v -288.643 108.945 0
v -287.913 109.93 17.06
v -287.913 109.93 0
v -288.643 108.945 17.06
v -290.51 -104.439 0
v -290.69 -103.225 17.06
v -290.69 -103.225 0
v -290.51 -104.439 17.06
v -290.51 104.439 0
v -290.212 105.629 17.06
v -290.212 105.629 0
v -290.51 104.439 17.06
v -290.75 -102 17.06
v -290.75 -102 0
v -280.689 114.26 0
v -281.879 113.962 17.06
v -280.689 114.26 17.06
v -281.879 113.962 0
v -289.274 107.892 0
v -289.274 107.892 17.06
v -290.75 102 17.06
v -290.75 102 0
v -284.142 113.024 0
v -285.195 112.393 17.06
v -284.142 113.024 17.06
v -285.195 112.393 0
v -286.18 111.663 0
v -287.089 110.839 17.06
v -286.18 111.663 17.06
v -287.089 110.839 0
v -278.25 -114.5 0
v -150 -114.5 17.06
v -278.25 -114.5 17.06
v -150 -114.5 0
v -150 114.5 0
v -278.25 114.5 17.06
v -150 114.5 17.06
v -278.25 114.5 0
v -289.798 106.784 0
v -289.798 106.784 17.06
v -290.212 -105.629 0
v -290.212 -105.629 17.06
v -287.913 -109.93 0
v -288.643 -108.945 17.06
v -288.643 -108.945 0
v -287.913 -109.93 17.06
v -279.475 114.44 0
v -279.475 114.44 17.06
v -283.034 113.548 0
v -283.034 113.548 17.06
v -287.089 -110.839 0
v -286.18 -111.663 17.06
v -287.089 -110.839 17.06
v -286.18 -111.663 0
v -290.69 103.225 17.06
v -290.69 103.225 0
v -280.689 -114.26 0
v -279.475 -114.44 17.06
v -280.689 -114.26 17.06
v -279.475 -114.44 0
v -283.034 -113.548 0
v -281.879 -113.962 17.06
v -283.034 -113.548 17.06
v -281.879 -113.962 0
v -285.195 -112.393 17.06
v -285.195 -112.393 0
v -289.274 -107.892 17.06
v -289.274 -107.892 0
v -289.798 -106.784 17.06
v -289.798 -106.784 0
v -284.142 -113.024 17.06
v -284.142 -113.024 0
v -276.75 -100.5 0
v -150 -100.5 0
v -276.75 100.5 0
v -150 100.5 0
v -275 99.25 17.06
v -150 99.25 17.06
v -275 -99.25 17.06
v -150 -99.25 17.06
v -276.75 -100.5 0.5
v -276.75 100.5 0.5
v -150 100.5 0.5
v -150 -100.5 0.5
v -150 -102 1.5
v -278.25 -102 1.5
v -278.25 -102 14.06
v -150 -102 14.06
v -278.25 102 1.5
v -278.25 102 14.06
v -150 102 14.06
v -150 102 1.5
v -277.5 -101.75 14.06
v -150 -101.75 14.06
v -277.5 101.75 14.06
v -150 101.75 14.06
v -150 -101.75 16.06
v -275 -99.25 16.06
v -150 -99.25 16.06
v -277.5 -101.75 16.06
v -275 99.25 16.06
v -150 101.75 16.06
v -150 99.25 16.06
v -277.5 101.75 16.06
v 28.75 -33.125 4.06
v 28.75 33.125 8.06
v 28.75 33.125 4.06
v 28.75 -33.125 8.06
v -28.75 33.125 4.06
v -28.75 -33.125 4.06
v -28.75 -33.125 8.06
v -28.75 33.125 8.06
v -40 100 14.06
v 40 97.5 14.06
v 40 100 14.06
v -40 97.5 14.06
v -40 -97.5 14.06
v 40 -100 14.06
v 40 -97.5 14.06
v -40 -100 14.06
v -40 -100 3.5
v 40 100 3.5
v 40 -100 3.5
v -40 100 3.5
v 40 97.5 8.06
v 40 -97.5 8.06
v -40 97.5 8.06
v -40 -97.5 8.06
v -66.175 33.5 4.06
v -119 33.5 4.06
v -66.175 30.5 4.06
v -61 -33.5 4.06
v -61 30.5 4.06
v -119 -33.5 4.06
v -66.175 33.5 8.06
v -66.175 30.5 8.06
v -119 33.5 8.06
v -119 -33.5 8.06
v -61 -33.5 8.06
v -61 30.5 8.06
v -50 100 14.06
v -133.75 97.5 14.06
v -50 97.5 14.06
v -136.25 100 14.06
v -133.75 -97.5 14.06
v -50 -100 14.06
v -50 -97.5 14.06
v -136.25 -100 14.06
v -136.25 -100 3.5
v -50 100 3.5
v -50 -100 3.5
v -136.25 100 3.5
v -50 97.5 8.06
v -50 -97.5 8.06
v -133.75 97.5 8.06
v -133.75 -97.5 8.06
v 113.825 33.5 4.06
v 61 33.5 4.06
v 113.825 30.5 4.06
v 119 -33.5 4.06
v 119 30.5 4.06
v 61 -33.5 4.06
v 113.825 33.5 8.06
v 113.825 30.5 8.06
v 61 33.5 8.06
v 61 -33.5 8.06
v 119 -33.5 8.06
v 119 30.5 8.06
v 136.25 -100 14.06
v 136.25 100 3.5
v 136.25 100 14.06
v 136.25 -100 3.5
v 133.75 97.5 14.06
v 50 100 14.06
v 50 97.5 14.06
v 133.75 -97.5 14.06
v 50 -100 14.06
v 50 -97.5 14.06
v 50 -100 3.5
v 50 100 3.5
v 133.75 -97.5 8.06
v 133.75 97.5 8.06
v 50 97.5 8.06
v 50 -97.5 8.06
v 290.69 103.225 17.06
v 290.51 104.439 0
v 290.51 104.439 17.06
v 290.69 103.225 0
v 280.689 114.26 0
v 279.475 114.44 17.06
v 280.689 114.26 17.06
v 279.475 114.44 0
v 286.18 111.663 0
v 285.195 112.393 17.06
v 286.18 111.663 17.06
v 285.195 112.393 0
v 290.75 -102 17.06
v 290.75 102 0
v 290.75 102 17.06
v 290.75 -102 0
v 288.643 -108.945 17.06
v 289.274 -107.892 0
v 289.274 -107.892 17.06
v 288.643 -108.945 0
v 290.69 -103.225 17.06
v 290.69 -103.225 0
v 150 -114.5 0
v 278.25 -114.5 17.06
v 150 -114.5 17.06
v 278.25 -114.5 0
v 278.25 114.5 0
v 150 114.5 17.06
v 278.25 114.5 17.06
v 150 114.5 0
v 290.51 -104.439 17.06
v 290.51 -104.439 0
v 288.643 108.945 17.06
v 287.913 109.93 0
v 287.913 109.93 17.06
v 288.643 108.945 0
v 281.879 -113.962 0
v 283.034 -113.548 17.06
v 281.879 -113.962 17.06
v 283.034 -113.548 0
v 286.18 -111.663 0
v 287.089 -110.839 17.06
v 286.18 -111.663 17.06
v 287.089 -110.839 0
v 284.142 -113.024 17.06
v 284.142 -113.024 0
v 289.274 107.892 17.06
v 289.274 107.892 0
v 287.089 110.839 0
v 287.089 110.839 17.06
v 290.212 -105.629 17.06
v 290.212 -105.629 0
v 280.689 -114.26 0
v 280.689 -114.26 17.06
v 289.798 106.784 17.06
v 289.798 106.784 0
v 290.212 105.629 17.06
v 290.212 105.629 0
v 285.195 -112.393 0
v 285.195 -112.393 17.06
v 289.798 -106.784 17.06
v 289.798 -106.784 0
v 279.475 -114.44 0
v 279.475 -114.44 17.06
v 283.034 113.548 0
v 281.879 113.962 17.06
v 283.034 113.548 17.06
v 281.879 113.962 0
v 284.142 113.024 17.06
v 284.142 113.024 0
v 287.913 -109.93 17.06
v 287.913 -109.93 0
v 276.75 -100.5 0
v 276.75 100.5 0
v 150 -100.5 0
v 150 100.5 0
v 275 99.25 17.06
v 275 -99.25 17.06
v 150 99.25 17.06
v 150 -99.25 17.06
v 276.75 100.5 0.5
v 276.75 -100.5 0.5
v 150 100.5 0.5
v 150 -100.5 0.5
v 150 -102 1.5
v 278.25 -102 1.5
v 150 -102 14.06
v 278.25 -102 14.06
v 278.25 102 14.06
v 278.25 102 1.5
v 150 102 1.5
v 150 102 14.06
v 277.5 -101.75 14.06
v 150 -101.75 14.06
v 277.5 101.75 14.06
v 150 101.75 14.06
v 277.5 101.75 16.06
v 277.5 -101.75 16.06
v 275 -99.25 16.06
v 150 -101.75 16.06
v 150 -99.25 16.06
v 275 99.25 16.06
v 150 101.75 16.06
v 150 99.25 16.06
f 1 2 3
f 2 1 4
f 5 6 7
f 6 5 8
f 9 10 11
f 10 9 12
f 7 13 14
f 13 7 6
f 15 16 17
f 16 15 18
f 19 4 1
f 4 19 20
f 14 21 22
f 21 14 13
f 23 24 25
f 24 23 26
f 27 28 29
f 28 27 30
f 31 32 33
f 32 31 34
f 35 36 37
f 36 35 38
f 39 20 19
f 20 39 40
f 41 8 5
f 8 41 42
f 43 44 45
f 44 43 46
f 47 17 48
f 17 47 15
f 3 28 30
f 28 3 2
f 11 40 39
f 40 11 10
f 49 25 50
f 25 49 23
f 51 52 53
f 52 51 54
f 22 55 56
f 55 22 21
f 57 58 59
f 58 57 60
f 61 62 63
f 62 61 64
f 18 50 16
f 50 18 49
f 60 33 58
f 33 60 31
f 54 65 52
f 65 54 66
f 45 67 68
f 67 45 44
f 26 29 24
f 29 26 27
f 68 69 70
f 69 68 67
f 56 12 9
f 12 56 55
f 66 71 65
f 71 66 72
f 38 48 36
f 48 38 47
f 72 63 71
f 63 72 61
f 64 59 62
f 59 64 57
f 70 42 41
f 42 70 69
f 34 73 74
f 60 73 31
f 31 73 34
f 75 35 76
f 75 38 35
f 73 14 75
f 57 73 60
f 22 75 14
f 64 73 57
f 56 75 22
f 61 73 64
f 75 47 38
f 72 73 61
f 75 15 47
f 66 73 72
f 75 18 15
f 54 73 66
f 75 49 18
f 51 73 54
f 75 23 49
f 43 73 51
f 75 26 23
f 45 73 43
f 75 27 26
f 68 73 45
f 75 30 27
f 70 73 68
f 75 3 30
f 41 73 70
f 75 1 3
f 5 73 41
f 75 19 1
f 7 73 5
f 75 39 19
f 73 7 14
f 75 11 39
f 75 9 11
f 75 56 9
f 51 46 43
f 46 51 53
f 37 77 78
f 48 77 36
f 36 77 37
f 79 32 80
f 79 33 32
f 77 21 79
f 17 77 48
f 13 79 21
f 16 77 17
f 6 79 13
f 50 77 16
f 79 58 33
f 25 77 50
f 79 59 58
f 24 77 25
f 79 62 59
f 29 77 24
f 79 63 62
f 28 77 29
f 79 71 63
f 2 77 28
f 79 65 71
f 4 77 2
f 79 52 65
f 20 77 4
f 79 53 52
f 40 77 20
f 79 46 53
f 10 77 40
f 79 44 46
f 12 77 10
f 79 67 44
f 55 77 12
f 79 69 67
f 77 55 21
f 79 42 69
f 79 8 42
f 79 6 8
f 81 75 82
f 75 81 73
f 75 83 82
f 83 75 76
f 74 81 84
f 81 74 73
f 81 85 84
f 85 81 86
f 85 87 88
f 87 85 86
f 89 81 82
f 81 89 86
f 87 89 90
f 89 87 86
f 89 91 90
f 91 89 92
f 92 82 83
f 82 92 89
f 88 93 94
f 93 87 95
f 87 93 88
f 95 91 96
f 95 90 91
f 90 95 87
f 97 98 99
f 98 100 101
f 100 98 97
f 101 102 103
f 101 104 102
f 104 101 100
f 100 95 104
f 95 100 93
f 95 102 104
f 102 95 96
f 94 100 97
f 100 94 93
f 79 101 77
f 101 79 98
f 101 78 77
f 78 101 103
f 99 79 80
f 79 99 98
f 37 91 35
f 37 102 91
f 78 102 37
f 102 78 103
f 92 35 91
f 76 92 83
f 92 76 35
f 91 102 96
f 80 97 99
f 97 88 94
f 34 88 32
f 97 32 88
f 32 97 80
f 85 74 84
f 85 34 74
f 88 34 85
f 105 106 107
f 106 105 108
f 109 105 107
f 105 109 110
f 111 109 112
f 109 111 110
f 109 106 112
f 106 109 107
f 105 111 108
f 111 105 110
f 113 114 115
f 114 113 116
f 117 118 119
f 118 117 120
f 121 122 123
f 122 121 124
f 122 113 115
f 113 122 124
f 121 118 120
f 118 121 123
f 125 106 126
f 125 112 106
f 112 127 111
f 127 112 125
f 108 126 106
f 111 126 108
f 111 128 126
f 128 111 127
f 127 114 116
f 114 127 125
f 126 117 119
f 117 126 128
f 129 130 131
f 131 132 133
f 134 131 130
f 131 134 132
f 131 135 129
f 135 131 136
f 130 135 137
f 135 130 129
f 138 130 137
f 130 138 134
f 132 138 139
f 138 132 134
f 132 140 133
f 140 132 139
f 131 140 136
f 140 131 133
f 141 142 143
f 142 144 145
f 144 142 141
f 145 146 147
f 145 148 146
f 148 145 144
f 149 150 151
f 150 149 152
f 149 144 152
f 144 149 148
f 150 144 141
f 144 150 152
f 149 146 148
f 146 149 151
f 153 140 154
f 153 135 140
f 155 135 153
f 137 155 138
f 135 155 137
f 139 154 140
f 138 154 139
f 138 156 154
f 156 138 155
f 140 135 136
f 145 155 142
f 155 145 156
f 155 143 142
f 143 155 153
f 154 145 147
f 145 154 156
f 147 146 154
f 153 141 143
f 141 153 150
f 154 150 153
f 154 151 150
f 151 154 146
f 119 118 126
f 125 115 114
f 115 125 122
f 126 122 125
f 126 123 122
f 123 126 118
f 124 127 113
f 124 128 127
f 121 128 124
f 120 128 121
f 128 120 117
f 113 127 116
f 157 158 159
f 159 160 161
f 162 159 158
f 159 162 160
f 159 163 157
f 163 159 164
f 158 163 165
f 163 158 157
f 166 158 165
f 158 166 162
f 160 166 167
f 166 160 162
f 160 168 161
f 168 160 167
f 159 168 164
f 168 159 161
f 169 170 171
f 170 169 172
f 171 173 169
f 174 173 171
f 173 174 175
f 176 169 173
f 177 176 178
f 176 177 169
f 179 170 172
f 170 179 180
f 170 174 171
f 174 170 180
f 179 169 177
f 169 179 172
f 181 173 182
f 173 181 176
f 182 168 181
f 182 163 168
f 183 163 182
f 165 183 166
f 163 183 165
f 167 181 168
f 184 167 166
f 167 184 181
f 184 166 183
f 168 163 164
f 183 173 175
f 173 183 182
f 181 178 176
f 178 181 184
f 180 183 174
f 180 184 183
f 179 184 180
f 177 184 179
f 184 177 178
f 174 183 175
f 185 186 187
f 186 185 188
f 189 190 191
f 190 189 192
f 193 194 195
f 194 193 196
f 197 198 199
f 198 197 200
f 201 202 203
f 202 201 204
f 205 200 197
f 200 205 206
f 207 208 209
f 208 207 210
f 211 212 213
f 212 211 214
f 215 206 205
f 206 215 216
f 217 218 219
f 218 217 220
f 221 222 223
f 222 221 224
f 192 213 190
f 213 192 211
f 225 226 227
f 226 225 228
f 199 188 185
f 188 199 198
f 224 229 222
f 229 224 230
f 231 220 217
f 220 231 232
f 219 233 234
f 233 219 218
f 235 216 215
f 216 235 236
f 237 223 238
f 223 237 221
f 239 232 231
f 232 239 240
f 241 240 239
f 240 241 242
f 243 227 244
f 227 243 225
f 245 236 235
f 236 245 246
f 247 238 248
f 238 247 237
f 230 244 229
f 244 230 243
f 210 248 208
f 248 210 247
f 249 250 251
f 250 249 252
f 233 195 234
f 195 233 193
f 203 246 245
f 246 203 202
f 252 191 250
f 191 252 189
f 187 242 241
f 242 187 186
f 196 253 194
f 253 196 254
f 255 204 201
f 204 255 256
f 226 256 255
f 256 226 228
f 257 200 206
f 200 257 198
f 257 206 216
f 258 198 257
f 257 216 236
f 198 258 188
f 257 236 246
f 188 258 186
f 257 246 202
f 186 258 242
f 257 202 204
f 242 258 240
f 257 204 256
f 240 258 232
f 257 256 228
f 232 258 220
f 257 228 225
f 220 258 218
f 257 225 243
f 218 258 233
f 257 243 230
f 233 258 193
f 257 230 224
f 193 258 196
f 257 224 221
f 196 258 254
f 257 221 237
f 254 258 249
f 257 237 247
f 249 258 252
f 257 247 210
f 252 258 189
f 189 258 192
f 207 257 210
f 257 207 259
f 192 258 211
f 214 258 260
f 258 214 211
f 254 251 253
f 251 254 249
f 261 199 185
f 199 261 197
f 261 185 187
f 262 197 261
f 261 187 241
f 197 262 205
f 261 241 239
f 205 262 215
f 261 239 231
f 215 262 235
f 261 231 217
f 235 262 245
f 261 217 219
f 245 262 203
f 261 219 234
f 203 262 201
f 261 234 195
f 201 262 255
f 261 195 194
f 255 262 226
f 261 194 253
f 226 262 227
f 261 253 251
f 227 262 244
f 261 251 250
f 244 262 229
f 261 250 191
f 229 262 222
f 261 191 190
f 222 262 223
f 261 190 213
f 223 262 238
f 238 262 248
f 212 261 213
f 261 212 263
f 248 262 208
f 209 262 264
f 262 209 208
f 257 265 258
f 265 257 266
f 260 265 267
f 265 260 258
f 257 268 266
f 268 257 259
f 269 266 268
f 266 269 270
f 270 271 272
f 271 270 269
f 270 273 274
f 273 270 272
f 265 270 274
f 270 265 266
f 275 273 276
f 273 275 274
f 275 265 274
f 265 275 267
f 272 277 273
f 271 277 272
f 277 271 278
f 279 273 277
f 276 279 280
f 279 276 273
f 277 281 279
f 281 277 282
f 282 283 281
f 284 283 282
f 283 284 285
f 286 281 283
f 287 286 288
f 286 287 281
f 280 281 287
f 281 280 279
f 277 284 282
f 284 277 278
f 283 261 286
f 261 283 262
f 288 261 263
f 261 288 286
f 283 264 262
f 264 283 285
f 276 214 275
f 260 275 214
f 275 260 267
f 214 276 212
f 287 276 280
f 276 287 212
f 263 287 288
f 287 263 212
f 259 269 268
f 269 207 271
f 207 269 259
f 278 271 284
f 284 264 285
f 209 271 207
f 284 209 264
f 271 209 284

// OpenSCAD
// file: ../inlays/nintendo_ds_game_card_inlay.scad
use <../../utilities/dictionary_get.scad>;

function nintendo_ds_game_card_inlay_width_mm() = 34;
function nintendo_ds_game_card_inlay_height_mm() = 36;

/**
 * A Nintendo DS game card (without the Nintendo 3DS tab).  Compatible with the
 * SPR, CTR, FTR, TWL and UTL models (and the un-codenamed "New 3DS" range).
 * Likely compatible with the USG and NTR models.
 * @param An array representing a dictionary, containing:
 *        - origin
 *          - x_mm - The origin of the inlay on the X axis, in millimeters.
 *          - y_mm - The origin of the inlay on the Y axis, in millimeters.
 * @return An array describing the inlay.
 */
function nintendo_ds_game_card_inlay(settings) =
  let (origin = dictionary_get(settings, "origin"))
  let (origin_x_mm = dictionary_get(origin, "x_mm"))
  let (origin_y_mm = dictionary_get(origin, "y_mm"))
  [
    ["type", "nintendo_ds_game_card"],
    [
      "origin",
      [
        ["x_mm", origin_x_mm],
        ["y_mm", origin_y_mm],
      ],
    ],
  ];
// file: ../utilities/settings.scad
/**
 * The number of millimeters that the glazing lip overlaps the glazing.
 */
function glazing_lip_thickness_mm() = 2.5;

/**
 * The depth of the glazing lip, in millimeters.
 */
function glazing_lip_depth_mm() = 1;

/**
 * The number of millimeters that the backing lip overlaps the backing.
 */
function backing_lip_thickness_mm() = 1.5;

/**
 * The depth of the backing lip, in millimeters.
 */
function backing_lip_depth_mm() = 1.5;

/**
 * The depth of slope to the backing lip, in millimeters.
 */
function backing_lip_slope_depth_mm() = 1;

/**
 * The minimum depth of the inlay layer, in millimeters.
 */
function inlay_bottom_depth_mm() = 0.56;

/**
 * The gap between the bottom of the glazing and the top of the displayed items,
 * in millimeters.
 */
function inlay_top_clearance_mm() = 1;

/**
 * The tolerance each side of the inlay in millimeters.
 */
function inlay_side_tolerance_mm() = 2;
// file: ../utilities/inlay_protrusion_depth_mm.scad
use <../../utilities/dictionary_get.scad>;

/**
 * Given an inlay, determines the depth (in millimeters) to which the inlay
 * should protrude from the frame.
 * @param inlay The inlay to measure.
 * @return      The depth (in millimeters) to which the inlay should protrude
 *              from the frame.
 */
function inlay_protrusion_depth_mm(inlay) = dictionary_get
(
  [
    ["nintendo_3ds_game_card", 1.3],
    ["nintendo_ds_game_card", 1.3],
    ["nintendo_game_boy_cartridge_a_or_b", 3],
    ["nintendo_game_boy_cartridge_c", 5],
  ],
  dictionary_get(inlay, "type")
);
// file: ../utilities/inlay_embed_depth_mm.scad
use <../../utilities/dictionary_get.scad>;

/**
 * Given an inlay, determines the depth (in millimeters) to which the inlay
 * should embed into the frame.
 * @param inlay The inlay to measure.
 * @return      The depth (in millimeters) to which the inlay should embed into
 *              the frame.
 */
function inlay_embed_depth_mm(inlay) = dictionary_get
(
  [
    ["nintendo_3ds_game_card", 2.5],
    ["nintendo_ds_game_card", 2.5],
    ["nintendo_game_boy_cartridge_a_or_b", 4],
    ["nintendo_game_boy_cartridge_c", 4],
  ],
  dictionary_get(inlay, "type")
);
// file: ../../utilities/dictionary_get.scad
/**
 * Retrieves a value by its key from an array representing a dictionary.
 * @param dictionary An array representing a dictionary.  Its contents must be
 *                   two-item arrays, each containing a key, then a value.
 * @param key        The key of the value to retrieve.
 * @return           The value matching the specified key.
 * @throws           When the key is not in the dictionary.
 * @throws           When the key is present in the dictionary multiple times.
 */
function dictionary_get(dictionary, key) =
  assert(
    len([for (item = dictionary) if (item[0] == key) item]) >= 1,
    "The given key was not found in the given dictionary"
  )
  assert(
    len([for (item = dictionary) if (item[0] == key) item]) <= 1,
    "The given key was found multiple times in the given dictionary"
  )
  [for (item = dictionary) if (item[0] == key) item][0][1];
// file: ../../utilities/slice_x.scad
module slice_x(left, right) {
  intersection() {
    translate([
      left,
      -10000,
      -10000,
    ]) {
      cube([
        right - left,
        20000,
        20000,
      ]);
    };

    children();
  };
};
// file: ../inlays/nintendo_game_boy_cartridge_c_inlay.scad
use <../../utilities/dictionary_get.scad>;

function nintendo_game_boy_cartridge_c_inlay_embed_width_mm() = 57.5;
function nintendo_game_boy_cartridge_c_inlay_embed_height_mm() = 66.25;

/**
 * A Nintendo Game Boy cartridge which does NOT have a notch in the top right
 * corner, compatible with the CGB, AGB and AGS models.
 * @param An array representing a dictionary, containing:
 *        - origin
 *          - x_mm - The origin of the inlay on the X axis, in millimeters.
 *          - y_mm - The origin of the inlay on the Y axis, in millimeters.
 * @return An array describing the inlay.
 */
function nintendo_game_boy_cartridge_c_inlay(settings) =
  let (origin = dictionary_get(settings, "origin"))
  let (origin_x_mm = dictionary_get(origin, "x_mm"))
  let (origin_y_mm = dictionary_get(origin, "y_mm"))
  [
    ["type", "nintendo_game_boy_cartridge_c"],
    [
      "origin",
      [
        ["x_mm", origin_x_mm],
        ["y_mm", origin_y_mm],
      ],
    ],
  ];

module nintendo_game_boy_cartridge_c_inlay(settings, inlay, embed_depth_mm) {
  translate([
    nintendo_game_boy_cartridge_c_inlay_embed_width_mm() / -2,
    nintendo_game_boy_cartridge_c_inlay_embed_height_mm() / -2,
    -embed_depth_mm,
  ]) {
    cube([
      nintendo_game_boy_cartridge_c_inlay_embed_width_mm(),
      nintendo_game_boy_cartridge_c_inlay_embed_height_mm(),
      embed_depth_mm,
    ]);
  };
};
// file: ../inlays/nintendo_game_boy_cartridge_a_or_b_inlay.scad
use <../../utilities/dictionary_get.scad>;

width_mm = 58;
height_mm = 67;

notch_width_mm = 5.175;
notch_height_mm = 3;

/**
 * A Nintendo Game Boy cartridge which has a notch in the top right corner,
 * compatible with the DMG, MGB, CGB, AGB and AGS models.
 * @param An array representing a dictionary, containing:
 *        - origin
 *          - x_mm - The origin of the inlay on the X axis, in millimeters.
 *          - y_mm - The origin of the inlay on the Y axis, in millimeters.
 * @return An array describing the inlay.
 */
function nintendo_game_boy_cartridge_a_or_b_inlay(settings) =
  let (origin = dictionary_get(settings, "origin"))
  let (origin_x_mm = dictionary_get(origin, "x_mm"))
  let (origin_y_mm = dictionary_get(origin, "y_mm"))
  [
    ["type", "nintendo_game_boy_cartridge_a_or_b"],
    [
      "origin",
      [
        ["x_mm", origin_x_mm],
        ["y_mm", origin_y_mm],
      ],
    ],
  ];

module nintendo_game_boy_cartridge_a_or_b_inlay(settings, inlay, embed_depth_mm) {
  translate([0, 0, -embed_depth_mm]) {
    linear_extrude(embed_depth_mm) {
      difference() {
        translate([width_mm / -2, height_mm / -2]) {
          square([width_mm, height_mm]);
        };

        translate([
          width_mm / 2 - notch_width_mm,
          height_mm / 2 - notch_height_mm,
        ]) {
          square([notch_width_mm, notch_height_mm]);
        };
      };
    };
  };
};
// file: ../borders/rounded_flat_border.scad
use <../../utilities/dictionary_get.scad>;

/**
 * A rounded flat border.
 * @param An array representing a dictionary, containing:
 *        - thickness_mm - The thickness of the frame in millimeters.
 *        - sides        - The number of sides per corner.
 * @return An array describing the border.
 */
function rounded_flat_border(settings) =
  let (thickness_mm = dictionary_get(settings, "thickness_mm"))
  let (sides = dictionary_get(settings, "sides"))
  [
    ["type", "rounded_flat"],
    ["thickness_mm", thickness_mm],
    ["sides", sides],
  ];
// file: ../backings/a4_backing.scad
/**
 * Measurements taken from a B&M "New York" frame.
 */
function a4_backing() = [
  ["width_mm", 256.5],
  ["height_mm", 204],
  ["depth_mm", 2],
];
// file: ../glazings/a4_glazing.scad
/**
 * Measurements taken from a B&M "New York" frame.
 */
function a4_glazing() = [
  ["width_mm", 255],
  ["height_mm", 203.5],
  ["depth_mm", 2],
];
// file: ../inlay.scad
use <../utilities/dictionary_get.scad>;
use <inlays/nintendo_ds_game_card_inlay.scad>;
use <inlays/nintendo_game_boy_cartridge_a_or_b_inlay.scad>;
use <inlays/nintendo_game_boy_cartridge_c_inlay.scad>;
use <utilities/inlay_embed_depth_mm.scad>;
use <utilities/inlay_protrusion_depth_mm.scad>;
use <utilities/settings.scad>;

module inlay(settings) {
  glazing = dictionary_get(settings, "glazing");
  glazing_width_mm = dictionary_get(glazing, "width_mm");
  glazing_height_mm = dictionary_get(glazing, "height_mm");

  backing = dictionary_get(settings, "backing");
  backing_width_mm = dictionary_get(backing, "width_mm");
  backing_height_mm = dictionary_get(backing, "height_mm");
  backing_depth_mm = dictionary_get(backing, "depth_mm");

  inlays = dictionary_get(settings, "inlays");

  greatest_inlay_embed_depth_mm = max([ for (inlay = inlays) inlay_embed_depth_mm(inlay) ]);
  greatest_inlay_protrusion_depth_mm = max([ for (inlay = inlays) inlay_protrusion_depth_mm(inlay) ]);

  inlay_width_mm = max(glazing_width_mm, backing_width_mm) - inlay_side_tolerance_mm() * 2;
  inlay_height_mm = max(glazing_height_mm, backing_height_mm) - inlay_side_tolerance_mm() * 2;

  difference() {
    translate([
      inlay_width_mm / -2,
      inlay_height_mm / -2,
      backing_lip_depth_mm()
        + backing_depth_mm,
    ]) {
      cube([
        inlay_width_mm,
        inlay_height_mm,
        inlay_bottom_depth_mm()
          + greatest_inlay_embed_depth_mm
          + greatest_inlay_protrusion_depth_mm
          + inlay_top_clearance_mm(),
      ]);
    };

    translate([
      inlay_width_mm / -2 + glazing_lip_thickness_mm(),
      inlay_height_mm / -2 + glazing_lip_thickness_mm(),
      backing_lip_depth_mm()
        + backing_depth_mm
        + inlay_bottom_depth_mm()
        + greatest_inlay_embed_depth_mm,
    ]) {
      cube([
        inlay_width_mm - glazing_lip_thickness_mm() * 2,
        inlay_height_mm - glazing_lip_thickness_mm() * 2,
        greatest_inlay_protrusion_depth_mm + inlay_top_clearance_mm(),
      ]);
    };

    translate([
      0,
      0,
      backing_lip_depth_mm()
        + backing_depth_mm
        + inlay_bottom_depth_mm()
        + greatest_inlay_embed_depth_mm,
    ]) {
      for (inlay = inlays) {
        inlay_type = dictionary_get(inlay, "type");

        embed_depth_mm = inlay_embed_depth_mm(inlay);

        origin = dictionary_get(inlay, "origin");

        origin_x_mm = dictionary_get(origin, "x_mm");
        origin_y_mm = dictionary_get(origin, "y_mm");

        translate([
          origin_x_mm,
          origin_y_mm,
          0,
        ]) {
          if (inlay_type == "nintendo_game_boy_cartridge_a_or_b") {
            nintendo_game_boy_cartridge_a_or_b_inlay(settings, inlay, embed_depth_mm);
          } else if (inlay_type == "nintendo_game_boy_cartridge_c") {
            nintendo_game_boy_cartridge_c_inlay(settings, inlay, embed_depth_mm);
          } else if (inlay_type == "nintendo_ds_game_card") {
            translate([
              nintendo_ds_game_card_inlay_width_mm() / -2,
              nintendo_ds_game_card_inlay_height_mm() / -2,
              -embed_depth_mm,
            ]) {
              cube([
                nintendo_ds_game_card_inlay_width_mm(),
                nintendo_ds_game_card_inlay_height_mm(),
                embed_depth_mm,
              ]);
            };
          } else {
            assert(false, "Unexpected inlay type");
          };
        };
      };
    };
  };
};
// file: ../frame.scad
use <../utilities/dictionary_get.scad>;
use <utilities/inlay_embed_depth_mm.scad>;
use <utilities/inlay_protrusion_depth_mm.scad>;
use <utilities/settings.scad>;

module frame(settings) {
  glazing = dictionary_get(settings, "glazing");
  glazing_width_mm = dictionary_get(glazing, "width_mm");
  glazing_height_mm = dictionary_get(glazing, "height_mm");
  glazing_depth_mm = dictionary_get(glazing, "depth_mm");

  backing = dictionary_get(settings, "backing");
  backing_width_mm = dictionary_get(backing, "width_mm");
  backing_height_mm = dictionary_get(backing, "height_mm");
  backing_depth_mm = dictionary_get(backing, "depth_mm");

  border = dictionary_get(settings, "border");
  border_type = dictionary_get(border, "type");
  border_thickness_mm = dictionary_get(border, "thickness_mm");

  inlays = dictionary_get(settings, "inlays");

  greatest_inlay_embed_depth_mm = max([ for (inlay = inlays) inlay_embed_depth_mm(inlay) ]);
  greatest_inlay_protrusion_depth_mm = max([ for (inlay = inlays) inlay_protrusion_depth_mm(inlay) ]);

  inlay_width_mm = max(glazing_width_mm, backing_width_mm);
  width_mm = inlay_width_mm + border_thickness_mm * 2;
  inlay_height_mm = max(glazing_height_mm, backing_height_mm);
  height_mm = inlay_height_mm + border_thickness_mm * 2;
  depth_mm =
    backing_lip_depth_mm()
    + backing_depth_mm
    + inlay_bottom_depth_mm()
    + greatest_inlay_embed_depth_mm
    + greatest_inlay_protrusion_depth_mm
    + inlay_top_clearance_mm()
    + glazing_depth_mm
    + glazing_lip_depth_mm();

  difference() {
    if (border_type == "square") {
      translate([
        width_mm / -2,
        height_mm / -2,
        0,
      ]) {
        cube([
          width_mm,
          height_mm,
          depth_mm,
        ]);
      };
    } else if (border_type == "rounded_flat") {
      border_thickness_mm = dictionary_get(border, "thickness_mm");
      border_sides = dictionary_get(border, "sides");

      linear_extrude(depth_mm) {
        hull() {
          translate([
            width_mm / -2 + border_thickness_mm,
            height_mm / -2 + border_thickness_mm,
          ]) {
            circle(r = border_thickness_mm, $fn = border_sides);
          };

          translate([
            width_mm / 2 - border_thickness_mm,
            height_mm / -2 + border_thickness_mm,
          ]) {
            circle(r = border_thickness_mm, $fn = border_sides);
          };

          translate([
            width_mm / -2 + border_thickness_mm,
            height_mm / 2 - border_thickness_mm,
          ]) {
            circle(r = border_thickness_mm, $fn = border_sides);
          };

          translate([
            width_mm / 2 - border_thickness_mm,
            height_mm / 2 - border_thickness_mm,
          ]) {
            circle(r = border_thickness_mm, $fn = border_sides);
          };
        };
      };
    } else {
      assert(false, "Unexpected inlay type");
    };

    backing_apeture_width_mm = backing_width_mm - backing_lip_thickness_mm() * 2;
    backing_apeture_height_mm = backing_height_mm - backing_lip_thickness_mm() * 2;

    translate([
      backing_apeture_width_mm / -2,
      backing_apeture_height_mm / -2,
      0,
    ]) {
      cube([
        backing_apeture_width_mm,
        backing_apeture_height_mm,
        backing_lip_depth_mm() - backing_lip_slope_depth_mm(),
      ]);
    };

    hull() {
      translate([
        backing_apeture_width_mm / -2,
        backing_apeture_height_mm / -2,
        backing_lip_depth_mm() - backing_lip_slope_depth_mm(),
      ]) {
        cube([
          backing_apeture_width_mm,
          backing_apeture_height_mm,
          backing_lip_slope_depth_mm(),
        ]);
      };

      translate([
        backing_width_mm / -2,
        backing_height_mm / -2,
        backing_lip_depth_mm(),
      ]) {
        cube([
          backing_width_mm,
          backing_height_mm,
          backing_depth_mm,
        ]);
      };
    };

    translate([
      backing_width_mm / -2,
      backing_height_mm / -2,
      backing_lip_depth_mm(),
    ]) {
      cube([
        backing_width_mm,
        backing_height_mm,
        backing_depth_mm,
      ]);
    };

    translate([
      inlay_width_mm / -2,
      inlay_height_mm / -2,
      backing_lip_depth_mm() + backing_depth_mm,
    ]) {
      cube([
        backing_width_mm,
        backing_height_mm,
        inlay_bottom_depth_mm()
          + greatest_inlay_embed_depth_mm
          + greatest_inlay_protrusion_depth_mm
          + inlay_top_clearance_mm(),
      ]);
    };

    translate([
      glazing_width_mm / -2,
      glazing_height_mm / -2,
      depth_mm - glazing_lip_depth_mm() - glazing_depth_mm,
    ]) {
      cube([
        glazing_width_mm,
        glazing_height_mm,
        glazing_depth_mm,
      ]);
    };

    glazing_apeture_width_mm = glazing_width_mm - glazing_lip_thickness_mm() * 2;
    glazing_apeture_height_mm = glazing_height_mm - glazing_lip_thickness_mm() * 2;

    translate([
      glazing_apeture_width_mm / -2,
      glazing_apeture_height_mm / -2,
      depth_mm - glazing_lip_depth_mm(),
    ]) {
      cube([
        glazing_apeture_width_mm,
        glazing_apeture_height_mm,
        glazing_lip_depth_mm(),
      ]);
    };
  };
};
// main file
use <../frame.scad>;
use <../inlay.scad>;
use <../glazings/a4_glazing.scad>;
use <../backings/a4_backing.scad>;
use <../borders/rounded_flat_border.scad>;
use <../inlays/nintendo_game_boy_cartridge_a_or_b_inlay.scad>;
use <../inlays/nintendo_game_boy_cartridge_c_inlay.scad>;
use <../../utilities/slice_x.scad>;

settings = [
  ["glazing", a4_glazing()],
  ["backing", a4_backing()],
  [
    "border",
    rounded_flat_border([
      ["thickness_mm", 12.5],
      ["sides", 64],
    ]),
  ],
  [
    "inlays", [
      nintendo_game_boy_cartridge_a_or_b_inlay([
        [
          "origin", [
            ["x_mm", -80],
            ["y_mm", 0],
          ],
        ],
      ]),
      nintendo_game_boy_cartridge_c_inlay([
        [
          "origin", [
            ["x_mm", 0],
            ["y_mm", 0],
          ],
        ],
      ]),
      nintendo_game_boy_cartridge_a_or_b_inlay([
        [
          "origin", [
            ["x_mm", 80],
            ["y_mm", 0],
          ],
        ],
      ]),
    ],
  ],
];

translate([-150, 0, 0]) {
  slice_x(-10000, 0) {
    frame(settings);
  };
};

translate([-10, 0, 0]) {
  slice_x(-10000, -40) {
    inlay(settings);
  };
};

slice_x(-40, 40) {
  inlay(settings);
};

translate([10, 0, 0]) {
  slice_x(40, 10000) {
    inlay(settings);
  };
};

translate([150, 0, 0]) {
  slice_x(0, 10000) {
    frame(settings);
  };
};
